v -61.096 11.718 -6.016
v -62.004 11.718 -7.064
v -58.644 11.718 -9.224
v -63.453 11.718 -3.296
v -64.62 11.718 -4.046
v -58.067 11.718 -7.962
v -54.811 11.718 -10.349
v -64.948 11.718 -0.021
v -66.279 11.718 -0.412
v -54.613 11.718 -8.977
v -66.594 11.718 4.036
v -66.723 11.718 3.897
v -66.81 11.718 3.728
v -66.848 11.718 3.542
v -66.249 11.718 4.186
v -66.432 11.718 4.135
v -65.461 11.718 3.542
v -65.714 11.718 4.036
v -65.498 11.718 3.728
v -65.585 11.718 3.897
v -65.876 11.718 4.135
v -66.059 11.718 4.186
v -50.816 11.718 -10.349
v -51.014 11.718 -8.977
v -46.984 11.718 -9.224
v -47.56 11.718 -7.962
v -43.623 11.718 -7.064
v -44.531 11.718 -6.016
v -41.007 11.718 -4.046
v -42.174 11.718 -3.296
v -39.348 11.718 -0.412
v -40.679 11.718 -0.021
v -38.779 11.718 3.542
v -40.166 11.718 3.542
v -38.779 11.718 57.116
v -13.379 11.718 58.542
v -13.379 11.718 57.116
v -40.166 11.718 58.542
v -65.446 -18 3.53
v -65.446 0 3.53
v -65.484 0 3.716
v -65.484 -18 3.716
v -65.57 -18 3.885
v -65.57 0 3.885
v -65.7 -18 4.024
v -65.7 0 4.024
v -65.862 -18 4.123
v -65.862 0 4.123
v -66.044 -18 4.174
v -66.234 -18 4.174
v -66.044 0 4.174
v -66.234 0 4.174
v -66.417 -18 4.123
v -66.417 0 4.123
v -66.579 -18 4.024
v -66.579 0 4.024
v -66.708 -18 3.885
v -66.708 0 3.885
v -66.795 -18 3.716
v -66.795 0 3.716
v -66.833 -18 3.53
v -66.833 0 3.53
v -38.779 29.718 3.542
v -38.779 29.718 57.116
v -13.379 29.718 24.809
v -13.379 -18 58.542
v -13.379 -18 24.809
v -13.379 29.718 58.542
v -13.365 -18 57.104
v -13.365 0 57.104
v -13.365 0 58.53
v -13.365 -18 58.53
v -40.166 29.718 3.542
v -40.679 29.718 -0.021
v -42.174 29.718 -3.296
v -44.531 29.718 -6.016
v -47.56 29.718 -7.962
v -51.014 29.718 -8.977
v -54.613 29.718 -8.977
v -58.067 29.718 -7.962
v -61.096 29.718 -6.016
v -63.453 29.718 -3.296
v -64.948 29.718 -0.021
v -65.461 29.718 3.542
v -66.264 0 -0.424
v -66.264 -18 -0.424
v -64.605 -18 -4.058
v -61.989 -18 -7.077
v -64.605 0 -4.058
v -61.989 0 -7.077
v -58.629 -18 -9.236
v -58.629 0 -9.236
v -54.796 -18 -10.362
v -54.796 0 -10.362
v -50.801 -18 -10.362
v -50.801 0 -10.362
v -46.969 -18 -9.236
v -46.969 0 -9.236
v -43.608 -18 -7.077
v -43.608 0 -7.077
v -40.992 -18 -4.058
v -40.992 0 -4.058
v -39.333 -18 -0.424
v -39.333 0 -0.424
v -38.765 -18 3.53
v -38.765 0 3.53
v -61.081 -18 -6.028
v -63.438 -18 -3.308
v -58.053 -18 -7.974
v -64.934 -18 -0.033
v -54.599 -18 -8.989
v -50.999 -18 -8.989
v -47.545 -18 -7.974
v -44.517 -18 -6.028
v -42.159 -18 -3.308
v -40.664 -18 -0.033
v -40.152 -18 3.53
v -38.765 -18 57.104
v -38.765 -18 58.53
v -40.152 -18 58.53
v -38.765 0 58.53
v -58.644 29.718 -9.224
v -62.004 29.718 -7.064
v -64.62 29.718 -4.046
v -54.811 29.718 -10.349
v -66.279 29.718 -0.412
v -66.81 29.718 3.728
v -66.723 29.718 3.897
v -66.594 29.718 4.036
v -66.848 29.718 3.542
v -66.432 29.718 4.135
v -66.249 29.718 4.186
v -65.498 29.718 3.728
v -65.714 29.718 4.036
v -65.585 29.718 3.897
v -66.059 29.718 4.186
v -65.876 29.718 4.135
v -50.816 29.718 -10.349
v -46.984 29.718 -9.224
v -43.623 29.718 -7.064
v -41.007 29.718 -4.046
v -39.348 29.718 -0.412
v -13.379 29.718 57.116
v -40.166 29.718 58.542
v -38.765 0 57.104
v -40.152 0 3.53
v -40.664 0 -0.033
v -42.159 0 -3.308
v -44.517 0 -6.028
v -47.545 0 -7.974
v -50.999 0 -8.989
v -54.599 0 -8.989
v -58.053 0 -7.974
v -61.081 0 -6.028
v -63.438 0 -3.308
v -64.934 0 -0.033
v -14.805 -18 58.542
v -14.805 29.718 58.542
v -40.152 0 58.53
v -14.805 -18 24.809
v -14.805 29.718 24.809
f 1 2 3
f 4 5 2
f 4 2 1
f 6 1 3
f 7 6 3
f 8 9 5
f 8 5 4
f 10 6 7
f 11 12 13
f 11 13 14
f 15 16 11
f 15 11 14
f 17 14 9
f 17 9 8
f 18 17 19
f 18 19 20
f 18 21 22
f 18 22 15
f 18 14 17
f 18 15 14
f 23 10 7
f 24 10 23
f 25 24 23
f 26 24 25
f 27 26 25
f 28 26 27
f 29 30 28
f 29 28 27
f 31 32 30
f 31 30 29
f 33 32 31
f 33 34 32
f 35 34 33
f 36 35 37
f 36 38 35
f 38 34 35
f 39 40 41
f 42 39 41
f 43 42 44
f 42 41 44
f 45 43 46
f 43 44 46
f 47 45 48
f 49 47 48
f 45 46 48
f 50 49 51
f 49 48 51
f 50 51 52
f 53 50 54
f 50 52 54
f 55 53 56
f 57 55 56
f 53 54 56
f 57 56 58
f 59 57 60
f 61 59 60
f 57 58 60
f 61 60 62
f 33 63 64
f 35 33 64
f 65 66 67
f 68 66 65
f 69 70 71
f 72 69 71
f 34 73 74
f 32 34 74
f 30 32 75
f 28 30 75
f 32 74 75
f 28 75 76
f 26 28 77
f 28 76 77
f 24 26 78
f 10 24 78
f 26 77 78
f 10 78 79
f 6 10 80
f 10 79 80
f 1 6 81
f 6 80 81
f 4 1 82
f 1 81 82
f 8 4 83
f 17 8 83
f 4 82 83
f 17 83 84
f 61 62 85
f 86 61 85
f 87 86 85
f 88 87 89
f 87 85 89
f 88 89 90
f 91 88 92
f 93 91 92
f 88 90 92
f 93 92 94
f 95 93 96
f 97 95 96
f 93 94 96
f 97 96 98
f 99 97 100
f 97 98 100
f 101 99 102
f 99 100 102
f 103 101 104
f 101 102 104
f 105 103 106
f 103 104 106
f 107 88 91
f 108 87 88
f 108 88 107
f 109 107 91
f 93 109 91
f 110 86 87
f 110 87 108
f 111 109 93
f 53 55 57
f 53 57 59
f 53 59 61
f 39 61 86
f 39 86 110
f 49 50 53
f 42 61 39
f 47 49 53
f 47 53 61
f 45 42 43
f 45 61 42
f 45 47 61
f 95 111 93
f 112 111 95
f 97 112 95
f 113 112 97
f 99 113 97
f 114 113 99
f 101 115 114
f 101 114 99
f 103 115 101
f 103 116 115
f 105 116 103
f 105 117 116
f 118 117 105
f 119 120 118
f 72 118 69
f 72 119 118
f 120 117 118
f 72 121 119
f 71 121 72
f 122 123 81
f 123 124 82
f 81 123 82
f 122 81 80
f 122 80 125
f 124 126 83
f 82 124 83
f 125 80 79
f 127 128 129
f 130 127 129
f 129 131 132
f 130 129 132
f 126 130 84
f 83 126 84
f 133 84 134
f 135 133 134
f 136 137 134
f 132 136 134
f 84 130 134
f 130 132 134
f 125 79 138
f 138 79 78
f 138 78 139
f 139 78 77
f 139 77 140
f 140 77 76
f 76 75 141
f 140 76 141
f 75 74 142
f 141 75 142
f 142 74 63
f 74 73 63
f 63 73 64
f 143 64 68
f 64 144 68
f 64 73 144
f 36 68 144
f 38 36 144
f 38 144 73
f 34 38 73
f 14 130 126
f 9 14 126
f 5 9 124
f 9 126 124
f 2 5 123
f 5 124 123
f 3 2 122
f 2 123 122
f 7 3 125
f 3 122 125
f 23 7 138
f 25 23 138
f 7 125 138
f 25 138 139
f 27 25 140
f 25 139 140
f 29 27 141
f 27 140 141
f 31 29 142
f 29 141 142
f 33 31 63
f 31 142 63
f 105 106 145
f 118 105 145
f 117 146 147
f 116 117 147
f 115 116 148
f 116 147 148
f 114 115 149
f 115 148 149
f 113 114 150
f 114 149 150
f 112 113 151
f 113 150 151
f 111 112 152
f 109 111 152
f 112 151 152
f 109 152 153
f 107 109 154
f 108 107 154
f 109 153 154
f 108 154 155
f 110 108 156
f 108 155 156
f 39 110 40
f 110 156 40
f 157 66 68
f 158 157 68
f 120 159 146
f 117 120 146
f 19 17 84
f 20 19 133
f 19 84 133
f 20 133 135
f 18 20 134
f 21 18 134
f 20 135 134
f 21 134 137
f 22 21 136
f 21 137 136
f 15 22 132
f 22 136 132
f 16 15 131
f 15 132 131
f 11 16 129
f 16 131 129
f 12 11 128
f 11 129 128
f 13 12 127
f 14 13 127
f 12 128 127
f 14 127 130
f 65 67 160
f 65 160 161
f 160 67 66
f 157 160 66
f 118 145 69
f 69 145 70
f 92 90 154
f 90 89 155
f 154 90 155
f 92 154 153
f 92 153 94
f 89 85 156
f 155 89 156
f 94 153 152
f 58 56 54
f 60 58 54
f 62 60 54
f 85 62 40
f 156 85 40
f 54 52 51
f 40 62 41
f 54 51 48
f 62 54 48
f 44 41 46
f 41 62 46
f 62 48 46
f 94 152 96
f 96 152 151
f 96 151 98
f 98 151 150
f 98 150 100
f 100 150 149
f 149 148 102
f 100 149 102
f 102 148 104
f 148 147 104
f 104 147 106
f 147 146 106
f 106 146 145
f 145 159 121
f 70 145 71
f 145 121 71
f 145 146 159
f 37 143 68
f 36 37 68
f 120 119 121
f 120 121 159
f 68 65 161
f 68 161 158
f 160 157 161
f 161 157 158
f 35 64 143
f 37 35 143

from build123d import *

# Parameters (mm, degrees)
F0_W     = 25.4
F0_H     = 1.425943
F1_DEPTH = 18
F3_W     = 25.4
F3_H     = 1.425942
F4_DEPTH = 18
F5_W     = 47.717995
F5_H     = 33.732459
F6_DEPTH = 1.425931


with BuildPart() as f1:
    # F0 (on Front) → F1 (new body)
    with BuildSketch(Plane.XZ):
        with Locations((-26.064605, 57.816789)):
            Rectangle(F0_W, F0_H)
        Polygon((-38.764605, 57.103818), (-38.764605, 58.529761), (-40.151687, 58.529761), (-40.151687, 3.529761), (-38.764605, 3.529761), align=None)
        with BuildLine():
            ThreePointArc((-66.832931, 3.529761), (-52.798768, -10.504403), (-38.764605, 3.529761))
            Line((-38.764605, 3.529761), (-40.151687, 3.529761))
            ThreePointArc((-40.151687, 3.529761), (-52.798762, -9.117314), (-65.445837, 3.529761))
            Line((-65.445837, 3.529761), (-66.832931, 3.529761))
        make_face()
        with BuildLine():
            ThreePointArc((-65.445837, 3.529761), (-66.139384, 4.18091), (-66.832931, 3.529761))
            Line((-66.832931, 3.529761), (-65.445837, 3.529761))
        make_face()
    extrude(amount=F1_DEPTH)


with BuildPart() as f4:
    # F3 (on offset) → F4 (new body)
    with BuildSketch(Plane.XZ.offset(-29.718)):
        with Locations((-26.079397, 57.828849)):
            Rectangle(F3_W, F3_H)
        Polygon((-38.779397, 57.115878), (-38.779397, 58.54182), (-40.166479, 58.54182), (-40.166479, 3.54182), (-38.779397, 3.54182), align=None)
        with BuildLine():
            ThreePointArc((-66.847723, 3.54182), (-52.81356, -10.492343), (-38.779397, 3.54182))
            Line((-38.779397, 3.54182), (-40.166479, 3.54182))
            ThreePointArc((-40.166479, 3.54182), (-52.813554, -9.105255), (-65.460629, 3.54182))
            Line((-65.460629, 3.54182), (-66.847723, 3.54182))
        make_face()
        with BuildLine():
            ThreePointArc((-65.460629, 3.54182), (-66.154176, 4.192969), (-66.847723, 3.54182))
            Line((-66.847723, 3.54182), (-65.460629, 3.54182))
        make_face()
    extrude(amount=F4_DEPTH)


with BuildPart() as f6:
    # F5 (on face) → F6 (new body)
    with BuildSketch(Plane.YZ.offset(-13.379397)):
        with Locations((5.859003, 41.67559)):
            Rectangle(F5_W, F5_H)
    extrude(amount=-F6_DEPTH)


solid = Compound([f1.part, f4.part, f6.part])
